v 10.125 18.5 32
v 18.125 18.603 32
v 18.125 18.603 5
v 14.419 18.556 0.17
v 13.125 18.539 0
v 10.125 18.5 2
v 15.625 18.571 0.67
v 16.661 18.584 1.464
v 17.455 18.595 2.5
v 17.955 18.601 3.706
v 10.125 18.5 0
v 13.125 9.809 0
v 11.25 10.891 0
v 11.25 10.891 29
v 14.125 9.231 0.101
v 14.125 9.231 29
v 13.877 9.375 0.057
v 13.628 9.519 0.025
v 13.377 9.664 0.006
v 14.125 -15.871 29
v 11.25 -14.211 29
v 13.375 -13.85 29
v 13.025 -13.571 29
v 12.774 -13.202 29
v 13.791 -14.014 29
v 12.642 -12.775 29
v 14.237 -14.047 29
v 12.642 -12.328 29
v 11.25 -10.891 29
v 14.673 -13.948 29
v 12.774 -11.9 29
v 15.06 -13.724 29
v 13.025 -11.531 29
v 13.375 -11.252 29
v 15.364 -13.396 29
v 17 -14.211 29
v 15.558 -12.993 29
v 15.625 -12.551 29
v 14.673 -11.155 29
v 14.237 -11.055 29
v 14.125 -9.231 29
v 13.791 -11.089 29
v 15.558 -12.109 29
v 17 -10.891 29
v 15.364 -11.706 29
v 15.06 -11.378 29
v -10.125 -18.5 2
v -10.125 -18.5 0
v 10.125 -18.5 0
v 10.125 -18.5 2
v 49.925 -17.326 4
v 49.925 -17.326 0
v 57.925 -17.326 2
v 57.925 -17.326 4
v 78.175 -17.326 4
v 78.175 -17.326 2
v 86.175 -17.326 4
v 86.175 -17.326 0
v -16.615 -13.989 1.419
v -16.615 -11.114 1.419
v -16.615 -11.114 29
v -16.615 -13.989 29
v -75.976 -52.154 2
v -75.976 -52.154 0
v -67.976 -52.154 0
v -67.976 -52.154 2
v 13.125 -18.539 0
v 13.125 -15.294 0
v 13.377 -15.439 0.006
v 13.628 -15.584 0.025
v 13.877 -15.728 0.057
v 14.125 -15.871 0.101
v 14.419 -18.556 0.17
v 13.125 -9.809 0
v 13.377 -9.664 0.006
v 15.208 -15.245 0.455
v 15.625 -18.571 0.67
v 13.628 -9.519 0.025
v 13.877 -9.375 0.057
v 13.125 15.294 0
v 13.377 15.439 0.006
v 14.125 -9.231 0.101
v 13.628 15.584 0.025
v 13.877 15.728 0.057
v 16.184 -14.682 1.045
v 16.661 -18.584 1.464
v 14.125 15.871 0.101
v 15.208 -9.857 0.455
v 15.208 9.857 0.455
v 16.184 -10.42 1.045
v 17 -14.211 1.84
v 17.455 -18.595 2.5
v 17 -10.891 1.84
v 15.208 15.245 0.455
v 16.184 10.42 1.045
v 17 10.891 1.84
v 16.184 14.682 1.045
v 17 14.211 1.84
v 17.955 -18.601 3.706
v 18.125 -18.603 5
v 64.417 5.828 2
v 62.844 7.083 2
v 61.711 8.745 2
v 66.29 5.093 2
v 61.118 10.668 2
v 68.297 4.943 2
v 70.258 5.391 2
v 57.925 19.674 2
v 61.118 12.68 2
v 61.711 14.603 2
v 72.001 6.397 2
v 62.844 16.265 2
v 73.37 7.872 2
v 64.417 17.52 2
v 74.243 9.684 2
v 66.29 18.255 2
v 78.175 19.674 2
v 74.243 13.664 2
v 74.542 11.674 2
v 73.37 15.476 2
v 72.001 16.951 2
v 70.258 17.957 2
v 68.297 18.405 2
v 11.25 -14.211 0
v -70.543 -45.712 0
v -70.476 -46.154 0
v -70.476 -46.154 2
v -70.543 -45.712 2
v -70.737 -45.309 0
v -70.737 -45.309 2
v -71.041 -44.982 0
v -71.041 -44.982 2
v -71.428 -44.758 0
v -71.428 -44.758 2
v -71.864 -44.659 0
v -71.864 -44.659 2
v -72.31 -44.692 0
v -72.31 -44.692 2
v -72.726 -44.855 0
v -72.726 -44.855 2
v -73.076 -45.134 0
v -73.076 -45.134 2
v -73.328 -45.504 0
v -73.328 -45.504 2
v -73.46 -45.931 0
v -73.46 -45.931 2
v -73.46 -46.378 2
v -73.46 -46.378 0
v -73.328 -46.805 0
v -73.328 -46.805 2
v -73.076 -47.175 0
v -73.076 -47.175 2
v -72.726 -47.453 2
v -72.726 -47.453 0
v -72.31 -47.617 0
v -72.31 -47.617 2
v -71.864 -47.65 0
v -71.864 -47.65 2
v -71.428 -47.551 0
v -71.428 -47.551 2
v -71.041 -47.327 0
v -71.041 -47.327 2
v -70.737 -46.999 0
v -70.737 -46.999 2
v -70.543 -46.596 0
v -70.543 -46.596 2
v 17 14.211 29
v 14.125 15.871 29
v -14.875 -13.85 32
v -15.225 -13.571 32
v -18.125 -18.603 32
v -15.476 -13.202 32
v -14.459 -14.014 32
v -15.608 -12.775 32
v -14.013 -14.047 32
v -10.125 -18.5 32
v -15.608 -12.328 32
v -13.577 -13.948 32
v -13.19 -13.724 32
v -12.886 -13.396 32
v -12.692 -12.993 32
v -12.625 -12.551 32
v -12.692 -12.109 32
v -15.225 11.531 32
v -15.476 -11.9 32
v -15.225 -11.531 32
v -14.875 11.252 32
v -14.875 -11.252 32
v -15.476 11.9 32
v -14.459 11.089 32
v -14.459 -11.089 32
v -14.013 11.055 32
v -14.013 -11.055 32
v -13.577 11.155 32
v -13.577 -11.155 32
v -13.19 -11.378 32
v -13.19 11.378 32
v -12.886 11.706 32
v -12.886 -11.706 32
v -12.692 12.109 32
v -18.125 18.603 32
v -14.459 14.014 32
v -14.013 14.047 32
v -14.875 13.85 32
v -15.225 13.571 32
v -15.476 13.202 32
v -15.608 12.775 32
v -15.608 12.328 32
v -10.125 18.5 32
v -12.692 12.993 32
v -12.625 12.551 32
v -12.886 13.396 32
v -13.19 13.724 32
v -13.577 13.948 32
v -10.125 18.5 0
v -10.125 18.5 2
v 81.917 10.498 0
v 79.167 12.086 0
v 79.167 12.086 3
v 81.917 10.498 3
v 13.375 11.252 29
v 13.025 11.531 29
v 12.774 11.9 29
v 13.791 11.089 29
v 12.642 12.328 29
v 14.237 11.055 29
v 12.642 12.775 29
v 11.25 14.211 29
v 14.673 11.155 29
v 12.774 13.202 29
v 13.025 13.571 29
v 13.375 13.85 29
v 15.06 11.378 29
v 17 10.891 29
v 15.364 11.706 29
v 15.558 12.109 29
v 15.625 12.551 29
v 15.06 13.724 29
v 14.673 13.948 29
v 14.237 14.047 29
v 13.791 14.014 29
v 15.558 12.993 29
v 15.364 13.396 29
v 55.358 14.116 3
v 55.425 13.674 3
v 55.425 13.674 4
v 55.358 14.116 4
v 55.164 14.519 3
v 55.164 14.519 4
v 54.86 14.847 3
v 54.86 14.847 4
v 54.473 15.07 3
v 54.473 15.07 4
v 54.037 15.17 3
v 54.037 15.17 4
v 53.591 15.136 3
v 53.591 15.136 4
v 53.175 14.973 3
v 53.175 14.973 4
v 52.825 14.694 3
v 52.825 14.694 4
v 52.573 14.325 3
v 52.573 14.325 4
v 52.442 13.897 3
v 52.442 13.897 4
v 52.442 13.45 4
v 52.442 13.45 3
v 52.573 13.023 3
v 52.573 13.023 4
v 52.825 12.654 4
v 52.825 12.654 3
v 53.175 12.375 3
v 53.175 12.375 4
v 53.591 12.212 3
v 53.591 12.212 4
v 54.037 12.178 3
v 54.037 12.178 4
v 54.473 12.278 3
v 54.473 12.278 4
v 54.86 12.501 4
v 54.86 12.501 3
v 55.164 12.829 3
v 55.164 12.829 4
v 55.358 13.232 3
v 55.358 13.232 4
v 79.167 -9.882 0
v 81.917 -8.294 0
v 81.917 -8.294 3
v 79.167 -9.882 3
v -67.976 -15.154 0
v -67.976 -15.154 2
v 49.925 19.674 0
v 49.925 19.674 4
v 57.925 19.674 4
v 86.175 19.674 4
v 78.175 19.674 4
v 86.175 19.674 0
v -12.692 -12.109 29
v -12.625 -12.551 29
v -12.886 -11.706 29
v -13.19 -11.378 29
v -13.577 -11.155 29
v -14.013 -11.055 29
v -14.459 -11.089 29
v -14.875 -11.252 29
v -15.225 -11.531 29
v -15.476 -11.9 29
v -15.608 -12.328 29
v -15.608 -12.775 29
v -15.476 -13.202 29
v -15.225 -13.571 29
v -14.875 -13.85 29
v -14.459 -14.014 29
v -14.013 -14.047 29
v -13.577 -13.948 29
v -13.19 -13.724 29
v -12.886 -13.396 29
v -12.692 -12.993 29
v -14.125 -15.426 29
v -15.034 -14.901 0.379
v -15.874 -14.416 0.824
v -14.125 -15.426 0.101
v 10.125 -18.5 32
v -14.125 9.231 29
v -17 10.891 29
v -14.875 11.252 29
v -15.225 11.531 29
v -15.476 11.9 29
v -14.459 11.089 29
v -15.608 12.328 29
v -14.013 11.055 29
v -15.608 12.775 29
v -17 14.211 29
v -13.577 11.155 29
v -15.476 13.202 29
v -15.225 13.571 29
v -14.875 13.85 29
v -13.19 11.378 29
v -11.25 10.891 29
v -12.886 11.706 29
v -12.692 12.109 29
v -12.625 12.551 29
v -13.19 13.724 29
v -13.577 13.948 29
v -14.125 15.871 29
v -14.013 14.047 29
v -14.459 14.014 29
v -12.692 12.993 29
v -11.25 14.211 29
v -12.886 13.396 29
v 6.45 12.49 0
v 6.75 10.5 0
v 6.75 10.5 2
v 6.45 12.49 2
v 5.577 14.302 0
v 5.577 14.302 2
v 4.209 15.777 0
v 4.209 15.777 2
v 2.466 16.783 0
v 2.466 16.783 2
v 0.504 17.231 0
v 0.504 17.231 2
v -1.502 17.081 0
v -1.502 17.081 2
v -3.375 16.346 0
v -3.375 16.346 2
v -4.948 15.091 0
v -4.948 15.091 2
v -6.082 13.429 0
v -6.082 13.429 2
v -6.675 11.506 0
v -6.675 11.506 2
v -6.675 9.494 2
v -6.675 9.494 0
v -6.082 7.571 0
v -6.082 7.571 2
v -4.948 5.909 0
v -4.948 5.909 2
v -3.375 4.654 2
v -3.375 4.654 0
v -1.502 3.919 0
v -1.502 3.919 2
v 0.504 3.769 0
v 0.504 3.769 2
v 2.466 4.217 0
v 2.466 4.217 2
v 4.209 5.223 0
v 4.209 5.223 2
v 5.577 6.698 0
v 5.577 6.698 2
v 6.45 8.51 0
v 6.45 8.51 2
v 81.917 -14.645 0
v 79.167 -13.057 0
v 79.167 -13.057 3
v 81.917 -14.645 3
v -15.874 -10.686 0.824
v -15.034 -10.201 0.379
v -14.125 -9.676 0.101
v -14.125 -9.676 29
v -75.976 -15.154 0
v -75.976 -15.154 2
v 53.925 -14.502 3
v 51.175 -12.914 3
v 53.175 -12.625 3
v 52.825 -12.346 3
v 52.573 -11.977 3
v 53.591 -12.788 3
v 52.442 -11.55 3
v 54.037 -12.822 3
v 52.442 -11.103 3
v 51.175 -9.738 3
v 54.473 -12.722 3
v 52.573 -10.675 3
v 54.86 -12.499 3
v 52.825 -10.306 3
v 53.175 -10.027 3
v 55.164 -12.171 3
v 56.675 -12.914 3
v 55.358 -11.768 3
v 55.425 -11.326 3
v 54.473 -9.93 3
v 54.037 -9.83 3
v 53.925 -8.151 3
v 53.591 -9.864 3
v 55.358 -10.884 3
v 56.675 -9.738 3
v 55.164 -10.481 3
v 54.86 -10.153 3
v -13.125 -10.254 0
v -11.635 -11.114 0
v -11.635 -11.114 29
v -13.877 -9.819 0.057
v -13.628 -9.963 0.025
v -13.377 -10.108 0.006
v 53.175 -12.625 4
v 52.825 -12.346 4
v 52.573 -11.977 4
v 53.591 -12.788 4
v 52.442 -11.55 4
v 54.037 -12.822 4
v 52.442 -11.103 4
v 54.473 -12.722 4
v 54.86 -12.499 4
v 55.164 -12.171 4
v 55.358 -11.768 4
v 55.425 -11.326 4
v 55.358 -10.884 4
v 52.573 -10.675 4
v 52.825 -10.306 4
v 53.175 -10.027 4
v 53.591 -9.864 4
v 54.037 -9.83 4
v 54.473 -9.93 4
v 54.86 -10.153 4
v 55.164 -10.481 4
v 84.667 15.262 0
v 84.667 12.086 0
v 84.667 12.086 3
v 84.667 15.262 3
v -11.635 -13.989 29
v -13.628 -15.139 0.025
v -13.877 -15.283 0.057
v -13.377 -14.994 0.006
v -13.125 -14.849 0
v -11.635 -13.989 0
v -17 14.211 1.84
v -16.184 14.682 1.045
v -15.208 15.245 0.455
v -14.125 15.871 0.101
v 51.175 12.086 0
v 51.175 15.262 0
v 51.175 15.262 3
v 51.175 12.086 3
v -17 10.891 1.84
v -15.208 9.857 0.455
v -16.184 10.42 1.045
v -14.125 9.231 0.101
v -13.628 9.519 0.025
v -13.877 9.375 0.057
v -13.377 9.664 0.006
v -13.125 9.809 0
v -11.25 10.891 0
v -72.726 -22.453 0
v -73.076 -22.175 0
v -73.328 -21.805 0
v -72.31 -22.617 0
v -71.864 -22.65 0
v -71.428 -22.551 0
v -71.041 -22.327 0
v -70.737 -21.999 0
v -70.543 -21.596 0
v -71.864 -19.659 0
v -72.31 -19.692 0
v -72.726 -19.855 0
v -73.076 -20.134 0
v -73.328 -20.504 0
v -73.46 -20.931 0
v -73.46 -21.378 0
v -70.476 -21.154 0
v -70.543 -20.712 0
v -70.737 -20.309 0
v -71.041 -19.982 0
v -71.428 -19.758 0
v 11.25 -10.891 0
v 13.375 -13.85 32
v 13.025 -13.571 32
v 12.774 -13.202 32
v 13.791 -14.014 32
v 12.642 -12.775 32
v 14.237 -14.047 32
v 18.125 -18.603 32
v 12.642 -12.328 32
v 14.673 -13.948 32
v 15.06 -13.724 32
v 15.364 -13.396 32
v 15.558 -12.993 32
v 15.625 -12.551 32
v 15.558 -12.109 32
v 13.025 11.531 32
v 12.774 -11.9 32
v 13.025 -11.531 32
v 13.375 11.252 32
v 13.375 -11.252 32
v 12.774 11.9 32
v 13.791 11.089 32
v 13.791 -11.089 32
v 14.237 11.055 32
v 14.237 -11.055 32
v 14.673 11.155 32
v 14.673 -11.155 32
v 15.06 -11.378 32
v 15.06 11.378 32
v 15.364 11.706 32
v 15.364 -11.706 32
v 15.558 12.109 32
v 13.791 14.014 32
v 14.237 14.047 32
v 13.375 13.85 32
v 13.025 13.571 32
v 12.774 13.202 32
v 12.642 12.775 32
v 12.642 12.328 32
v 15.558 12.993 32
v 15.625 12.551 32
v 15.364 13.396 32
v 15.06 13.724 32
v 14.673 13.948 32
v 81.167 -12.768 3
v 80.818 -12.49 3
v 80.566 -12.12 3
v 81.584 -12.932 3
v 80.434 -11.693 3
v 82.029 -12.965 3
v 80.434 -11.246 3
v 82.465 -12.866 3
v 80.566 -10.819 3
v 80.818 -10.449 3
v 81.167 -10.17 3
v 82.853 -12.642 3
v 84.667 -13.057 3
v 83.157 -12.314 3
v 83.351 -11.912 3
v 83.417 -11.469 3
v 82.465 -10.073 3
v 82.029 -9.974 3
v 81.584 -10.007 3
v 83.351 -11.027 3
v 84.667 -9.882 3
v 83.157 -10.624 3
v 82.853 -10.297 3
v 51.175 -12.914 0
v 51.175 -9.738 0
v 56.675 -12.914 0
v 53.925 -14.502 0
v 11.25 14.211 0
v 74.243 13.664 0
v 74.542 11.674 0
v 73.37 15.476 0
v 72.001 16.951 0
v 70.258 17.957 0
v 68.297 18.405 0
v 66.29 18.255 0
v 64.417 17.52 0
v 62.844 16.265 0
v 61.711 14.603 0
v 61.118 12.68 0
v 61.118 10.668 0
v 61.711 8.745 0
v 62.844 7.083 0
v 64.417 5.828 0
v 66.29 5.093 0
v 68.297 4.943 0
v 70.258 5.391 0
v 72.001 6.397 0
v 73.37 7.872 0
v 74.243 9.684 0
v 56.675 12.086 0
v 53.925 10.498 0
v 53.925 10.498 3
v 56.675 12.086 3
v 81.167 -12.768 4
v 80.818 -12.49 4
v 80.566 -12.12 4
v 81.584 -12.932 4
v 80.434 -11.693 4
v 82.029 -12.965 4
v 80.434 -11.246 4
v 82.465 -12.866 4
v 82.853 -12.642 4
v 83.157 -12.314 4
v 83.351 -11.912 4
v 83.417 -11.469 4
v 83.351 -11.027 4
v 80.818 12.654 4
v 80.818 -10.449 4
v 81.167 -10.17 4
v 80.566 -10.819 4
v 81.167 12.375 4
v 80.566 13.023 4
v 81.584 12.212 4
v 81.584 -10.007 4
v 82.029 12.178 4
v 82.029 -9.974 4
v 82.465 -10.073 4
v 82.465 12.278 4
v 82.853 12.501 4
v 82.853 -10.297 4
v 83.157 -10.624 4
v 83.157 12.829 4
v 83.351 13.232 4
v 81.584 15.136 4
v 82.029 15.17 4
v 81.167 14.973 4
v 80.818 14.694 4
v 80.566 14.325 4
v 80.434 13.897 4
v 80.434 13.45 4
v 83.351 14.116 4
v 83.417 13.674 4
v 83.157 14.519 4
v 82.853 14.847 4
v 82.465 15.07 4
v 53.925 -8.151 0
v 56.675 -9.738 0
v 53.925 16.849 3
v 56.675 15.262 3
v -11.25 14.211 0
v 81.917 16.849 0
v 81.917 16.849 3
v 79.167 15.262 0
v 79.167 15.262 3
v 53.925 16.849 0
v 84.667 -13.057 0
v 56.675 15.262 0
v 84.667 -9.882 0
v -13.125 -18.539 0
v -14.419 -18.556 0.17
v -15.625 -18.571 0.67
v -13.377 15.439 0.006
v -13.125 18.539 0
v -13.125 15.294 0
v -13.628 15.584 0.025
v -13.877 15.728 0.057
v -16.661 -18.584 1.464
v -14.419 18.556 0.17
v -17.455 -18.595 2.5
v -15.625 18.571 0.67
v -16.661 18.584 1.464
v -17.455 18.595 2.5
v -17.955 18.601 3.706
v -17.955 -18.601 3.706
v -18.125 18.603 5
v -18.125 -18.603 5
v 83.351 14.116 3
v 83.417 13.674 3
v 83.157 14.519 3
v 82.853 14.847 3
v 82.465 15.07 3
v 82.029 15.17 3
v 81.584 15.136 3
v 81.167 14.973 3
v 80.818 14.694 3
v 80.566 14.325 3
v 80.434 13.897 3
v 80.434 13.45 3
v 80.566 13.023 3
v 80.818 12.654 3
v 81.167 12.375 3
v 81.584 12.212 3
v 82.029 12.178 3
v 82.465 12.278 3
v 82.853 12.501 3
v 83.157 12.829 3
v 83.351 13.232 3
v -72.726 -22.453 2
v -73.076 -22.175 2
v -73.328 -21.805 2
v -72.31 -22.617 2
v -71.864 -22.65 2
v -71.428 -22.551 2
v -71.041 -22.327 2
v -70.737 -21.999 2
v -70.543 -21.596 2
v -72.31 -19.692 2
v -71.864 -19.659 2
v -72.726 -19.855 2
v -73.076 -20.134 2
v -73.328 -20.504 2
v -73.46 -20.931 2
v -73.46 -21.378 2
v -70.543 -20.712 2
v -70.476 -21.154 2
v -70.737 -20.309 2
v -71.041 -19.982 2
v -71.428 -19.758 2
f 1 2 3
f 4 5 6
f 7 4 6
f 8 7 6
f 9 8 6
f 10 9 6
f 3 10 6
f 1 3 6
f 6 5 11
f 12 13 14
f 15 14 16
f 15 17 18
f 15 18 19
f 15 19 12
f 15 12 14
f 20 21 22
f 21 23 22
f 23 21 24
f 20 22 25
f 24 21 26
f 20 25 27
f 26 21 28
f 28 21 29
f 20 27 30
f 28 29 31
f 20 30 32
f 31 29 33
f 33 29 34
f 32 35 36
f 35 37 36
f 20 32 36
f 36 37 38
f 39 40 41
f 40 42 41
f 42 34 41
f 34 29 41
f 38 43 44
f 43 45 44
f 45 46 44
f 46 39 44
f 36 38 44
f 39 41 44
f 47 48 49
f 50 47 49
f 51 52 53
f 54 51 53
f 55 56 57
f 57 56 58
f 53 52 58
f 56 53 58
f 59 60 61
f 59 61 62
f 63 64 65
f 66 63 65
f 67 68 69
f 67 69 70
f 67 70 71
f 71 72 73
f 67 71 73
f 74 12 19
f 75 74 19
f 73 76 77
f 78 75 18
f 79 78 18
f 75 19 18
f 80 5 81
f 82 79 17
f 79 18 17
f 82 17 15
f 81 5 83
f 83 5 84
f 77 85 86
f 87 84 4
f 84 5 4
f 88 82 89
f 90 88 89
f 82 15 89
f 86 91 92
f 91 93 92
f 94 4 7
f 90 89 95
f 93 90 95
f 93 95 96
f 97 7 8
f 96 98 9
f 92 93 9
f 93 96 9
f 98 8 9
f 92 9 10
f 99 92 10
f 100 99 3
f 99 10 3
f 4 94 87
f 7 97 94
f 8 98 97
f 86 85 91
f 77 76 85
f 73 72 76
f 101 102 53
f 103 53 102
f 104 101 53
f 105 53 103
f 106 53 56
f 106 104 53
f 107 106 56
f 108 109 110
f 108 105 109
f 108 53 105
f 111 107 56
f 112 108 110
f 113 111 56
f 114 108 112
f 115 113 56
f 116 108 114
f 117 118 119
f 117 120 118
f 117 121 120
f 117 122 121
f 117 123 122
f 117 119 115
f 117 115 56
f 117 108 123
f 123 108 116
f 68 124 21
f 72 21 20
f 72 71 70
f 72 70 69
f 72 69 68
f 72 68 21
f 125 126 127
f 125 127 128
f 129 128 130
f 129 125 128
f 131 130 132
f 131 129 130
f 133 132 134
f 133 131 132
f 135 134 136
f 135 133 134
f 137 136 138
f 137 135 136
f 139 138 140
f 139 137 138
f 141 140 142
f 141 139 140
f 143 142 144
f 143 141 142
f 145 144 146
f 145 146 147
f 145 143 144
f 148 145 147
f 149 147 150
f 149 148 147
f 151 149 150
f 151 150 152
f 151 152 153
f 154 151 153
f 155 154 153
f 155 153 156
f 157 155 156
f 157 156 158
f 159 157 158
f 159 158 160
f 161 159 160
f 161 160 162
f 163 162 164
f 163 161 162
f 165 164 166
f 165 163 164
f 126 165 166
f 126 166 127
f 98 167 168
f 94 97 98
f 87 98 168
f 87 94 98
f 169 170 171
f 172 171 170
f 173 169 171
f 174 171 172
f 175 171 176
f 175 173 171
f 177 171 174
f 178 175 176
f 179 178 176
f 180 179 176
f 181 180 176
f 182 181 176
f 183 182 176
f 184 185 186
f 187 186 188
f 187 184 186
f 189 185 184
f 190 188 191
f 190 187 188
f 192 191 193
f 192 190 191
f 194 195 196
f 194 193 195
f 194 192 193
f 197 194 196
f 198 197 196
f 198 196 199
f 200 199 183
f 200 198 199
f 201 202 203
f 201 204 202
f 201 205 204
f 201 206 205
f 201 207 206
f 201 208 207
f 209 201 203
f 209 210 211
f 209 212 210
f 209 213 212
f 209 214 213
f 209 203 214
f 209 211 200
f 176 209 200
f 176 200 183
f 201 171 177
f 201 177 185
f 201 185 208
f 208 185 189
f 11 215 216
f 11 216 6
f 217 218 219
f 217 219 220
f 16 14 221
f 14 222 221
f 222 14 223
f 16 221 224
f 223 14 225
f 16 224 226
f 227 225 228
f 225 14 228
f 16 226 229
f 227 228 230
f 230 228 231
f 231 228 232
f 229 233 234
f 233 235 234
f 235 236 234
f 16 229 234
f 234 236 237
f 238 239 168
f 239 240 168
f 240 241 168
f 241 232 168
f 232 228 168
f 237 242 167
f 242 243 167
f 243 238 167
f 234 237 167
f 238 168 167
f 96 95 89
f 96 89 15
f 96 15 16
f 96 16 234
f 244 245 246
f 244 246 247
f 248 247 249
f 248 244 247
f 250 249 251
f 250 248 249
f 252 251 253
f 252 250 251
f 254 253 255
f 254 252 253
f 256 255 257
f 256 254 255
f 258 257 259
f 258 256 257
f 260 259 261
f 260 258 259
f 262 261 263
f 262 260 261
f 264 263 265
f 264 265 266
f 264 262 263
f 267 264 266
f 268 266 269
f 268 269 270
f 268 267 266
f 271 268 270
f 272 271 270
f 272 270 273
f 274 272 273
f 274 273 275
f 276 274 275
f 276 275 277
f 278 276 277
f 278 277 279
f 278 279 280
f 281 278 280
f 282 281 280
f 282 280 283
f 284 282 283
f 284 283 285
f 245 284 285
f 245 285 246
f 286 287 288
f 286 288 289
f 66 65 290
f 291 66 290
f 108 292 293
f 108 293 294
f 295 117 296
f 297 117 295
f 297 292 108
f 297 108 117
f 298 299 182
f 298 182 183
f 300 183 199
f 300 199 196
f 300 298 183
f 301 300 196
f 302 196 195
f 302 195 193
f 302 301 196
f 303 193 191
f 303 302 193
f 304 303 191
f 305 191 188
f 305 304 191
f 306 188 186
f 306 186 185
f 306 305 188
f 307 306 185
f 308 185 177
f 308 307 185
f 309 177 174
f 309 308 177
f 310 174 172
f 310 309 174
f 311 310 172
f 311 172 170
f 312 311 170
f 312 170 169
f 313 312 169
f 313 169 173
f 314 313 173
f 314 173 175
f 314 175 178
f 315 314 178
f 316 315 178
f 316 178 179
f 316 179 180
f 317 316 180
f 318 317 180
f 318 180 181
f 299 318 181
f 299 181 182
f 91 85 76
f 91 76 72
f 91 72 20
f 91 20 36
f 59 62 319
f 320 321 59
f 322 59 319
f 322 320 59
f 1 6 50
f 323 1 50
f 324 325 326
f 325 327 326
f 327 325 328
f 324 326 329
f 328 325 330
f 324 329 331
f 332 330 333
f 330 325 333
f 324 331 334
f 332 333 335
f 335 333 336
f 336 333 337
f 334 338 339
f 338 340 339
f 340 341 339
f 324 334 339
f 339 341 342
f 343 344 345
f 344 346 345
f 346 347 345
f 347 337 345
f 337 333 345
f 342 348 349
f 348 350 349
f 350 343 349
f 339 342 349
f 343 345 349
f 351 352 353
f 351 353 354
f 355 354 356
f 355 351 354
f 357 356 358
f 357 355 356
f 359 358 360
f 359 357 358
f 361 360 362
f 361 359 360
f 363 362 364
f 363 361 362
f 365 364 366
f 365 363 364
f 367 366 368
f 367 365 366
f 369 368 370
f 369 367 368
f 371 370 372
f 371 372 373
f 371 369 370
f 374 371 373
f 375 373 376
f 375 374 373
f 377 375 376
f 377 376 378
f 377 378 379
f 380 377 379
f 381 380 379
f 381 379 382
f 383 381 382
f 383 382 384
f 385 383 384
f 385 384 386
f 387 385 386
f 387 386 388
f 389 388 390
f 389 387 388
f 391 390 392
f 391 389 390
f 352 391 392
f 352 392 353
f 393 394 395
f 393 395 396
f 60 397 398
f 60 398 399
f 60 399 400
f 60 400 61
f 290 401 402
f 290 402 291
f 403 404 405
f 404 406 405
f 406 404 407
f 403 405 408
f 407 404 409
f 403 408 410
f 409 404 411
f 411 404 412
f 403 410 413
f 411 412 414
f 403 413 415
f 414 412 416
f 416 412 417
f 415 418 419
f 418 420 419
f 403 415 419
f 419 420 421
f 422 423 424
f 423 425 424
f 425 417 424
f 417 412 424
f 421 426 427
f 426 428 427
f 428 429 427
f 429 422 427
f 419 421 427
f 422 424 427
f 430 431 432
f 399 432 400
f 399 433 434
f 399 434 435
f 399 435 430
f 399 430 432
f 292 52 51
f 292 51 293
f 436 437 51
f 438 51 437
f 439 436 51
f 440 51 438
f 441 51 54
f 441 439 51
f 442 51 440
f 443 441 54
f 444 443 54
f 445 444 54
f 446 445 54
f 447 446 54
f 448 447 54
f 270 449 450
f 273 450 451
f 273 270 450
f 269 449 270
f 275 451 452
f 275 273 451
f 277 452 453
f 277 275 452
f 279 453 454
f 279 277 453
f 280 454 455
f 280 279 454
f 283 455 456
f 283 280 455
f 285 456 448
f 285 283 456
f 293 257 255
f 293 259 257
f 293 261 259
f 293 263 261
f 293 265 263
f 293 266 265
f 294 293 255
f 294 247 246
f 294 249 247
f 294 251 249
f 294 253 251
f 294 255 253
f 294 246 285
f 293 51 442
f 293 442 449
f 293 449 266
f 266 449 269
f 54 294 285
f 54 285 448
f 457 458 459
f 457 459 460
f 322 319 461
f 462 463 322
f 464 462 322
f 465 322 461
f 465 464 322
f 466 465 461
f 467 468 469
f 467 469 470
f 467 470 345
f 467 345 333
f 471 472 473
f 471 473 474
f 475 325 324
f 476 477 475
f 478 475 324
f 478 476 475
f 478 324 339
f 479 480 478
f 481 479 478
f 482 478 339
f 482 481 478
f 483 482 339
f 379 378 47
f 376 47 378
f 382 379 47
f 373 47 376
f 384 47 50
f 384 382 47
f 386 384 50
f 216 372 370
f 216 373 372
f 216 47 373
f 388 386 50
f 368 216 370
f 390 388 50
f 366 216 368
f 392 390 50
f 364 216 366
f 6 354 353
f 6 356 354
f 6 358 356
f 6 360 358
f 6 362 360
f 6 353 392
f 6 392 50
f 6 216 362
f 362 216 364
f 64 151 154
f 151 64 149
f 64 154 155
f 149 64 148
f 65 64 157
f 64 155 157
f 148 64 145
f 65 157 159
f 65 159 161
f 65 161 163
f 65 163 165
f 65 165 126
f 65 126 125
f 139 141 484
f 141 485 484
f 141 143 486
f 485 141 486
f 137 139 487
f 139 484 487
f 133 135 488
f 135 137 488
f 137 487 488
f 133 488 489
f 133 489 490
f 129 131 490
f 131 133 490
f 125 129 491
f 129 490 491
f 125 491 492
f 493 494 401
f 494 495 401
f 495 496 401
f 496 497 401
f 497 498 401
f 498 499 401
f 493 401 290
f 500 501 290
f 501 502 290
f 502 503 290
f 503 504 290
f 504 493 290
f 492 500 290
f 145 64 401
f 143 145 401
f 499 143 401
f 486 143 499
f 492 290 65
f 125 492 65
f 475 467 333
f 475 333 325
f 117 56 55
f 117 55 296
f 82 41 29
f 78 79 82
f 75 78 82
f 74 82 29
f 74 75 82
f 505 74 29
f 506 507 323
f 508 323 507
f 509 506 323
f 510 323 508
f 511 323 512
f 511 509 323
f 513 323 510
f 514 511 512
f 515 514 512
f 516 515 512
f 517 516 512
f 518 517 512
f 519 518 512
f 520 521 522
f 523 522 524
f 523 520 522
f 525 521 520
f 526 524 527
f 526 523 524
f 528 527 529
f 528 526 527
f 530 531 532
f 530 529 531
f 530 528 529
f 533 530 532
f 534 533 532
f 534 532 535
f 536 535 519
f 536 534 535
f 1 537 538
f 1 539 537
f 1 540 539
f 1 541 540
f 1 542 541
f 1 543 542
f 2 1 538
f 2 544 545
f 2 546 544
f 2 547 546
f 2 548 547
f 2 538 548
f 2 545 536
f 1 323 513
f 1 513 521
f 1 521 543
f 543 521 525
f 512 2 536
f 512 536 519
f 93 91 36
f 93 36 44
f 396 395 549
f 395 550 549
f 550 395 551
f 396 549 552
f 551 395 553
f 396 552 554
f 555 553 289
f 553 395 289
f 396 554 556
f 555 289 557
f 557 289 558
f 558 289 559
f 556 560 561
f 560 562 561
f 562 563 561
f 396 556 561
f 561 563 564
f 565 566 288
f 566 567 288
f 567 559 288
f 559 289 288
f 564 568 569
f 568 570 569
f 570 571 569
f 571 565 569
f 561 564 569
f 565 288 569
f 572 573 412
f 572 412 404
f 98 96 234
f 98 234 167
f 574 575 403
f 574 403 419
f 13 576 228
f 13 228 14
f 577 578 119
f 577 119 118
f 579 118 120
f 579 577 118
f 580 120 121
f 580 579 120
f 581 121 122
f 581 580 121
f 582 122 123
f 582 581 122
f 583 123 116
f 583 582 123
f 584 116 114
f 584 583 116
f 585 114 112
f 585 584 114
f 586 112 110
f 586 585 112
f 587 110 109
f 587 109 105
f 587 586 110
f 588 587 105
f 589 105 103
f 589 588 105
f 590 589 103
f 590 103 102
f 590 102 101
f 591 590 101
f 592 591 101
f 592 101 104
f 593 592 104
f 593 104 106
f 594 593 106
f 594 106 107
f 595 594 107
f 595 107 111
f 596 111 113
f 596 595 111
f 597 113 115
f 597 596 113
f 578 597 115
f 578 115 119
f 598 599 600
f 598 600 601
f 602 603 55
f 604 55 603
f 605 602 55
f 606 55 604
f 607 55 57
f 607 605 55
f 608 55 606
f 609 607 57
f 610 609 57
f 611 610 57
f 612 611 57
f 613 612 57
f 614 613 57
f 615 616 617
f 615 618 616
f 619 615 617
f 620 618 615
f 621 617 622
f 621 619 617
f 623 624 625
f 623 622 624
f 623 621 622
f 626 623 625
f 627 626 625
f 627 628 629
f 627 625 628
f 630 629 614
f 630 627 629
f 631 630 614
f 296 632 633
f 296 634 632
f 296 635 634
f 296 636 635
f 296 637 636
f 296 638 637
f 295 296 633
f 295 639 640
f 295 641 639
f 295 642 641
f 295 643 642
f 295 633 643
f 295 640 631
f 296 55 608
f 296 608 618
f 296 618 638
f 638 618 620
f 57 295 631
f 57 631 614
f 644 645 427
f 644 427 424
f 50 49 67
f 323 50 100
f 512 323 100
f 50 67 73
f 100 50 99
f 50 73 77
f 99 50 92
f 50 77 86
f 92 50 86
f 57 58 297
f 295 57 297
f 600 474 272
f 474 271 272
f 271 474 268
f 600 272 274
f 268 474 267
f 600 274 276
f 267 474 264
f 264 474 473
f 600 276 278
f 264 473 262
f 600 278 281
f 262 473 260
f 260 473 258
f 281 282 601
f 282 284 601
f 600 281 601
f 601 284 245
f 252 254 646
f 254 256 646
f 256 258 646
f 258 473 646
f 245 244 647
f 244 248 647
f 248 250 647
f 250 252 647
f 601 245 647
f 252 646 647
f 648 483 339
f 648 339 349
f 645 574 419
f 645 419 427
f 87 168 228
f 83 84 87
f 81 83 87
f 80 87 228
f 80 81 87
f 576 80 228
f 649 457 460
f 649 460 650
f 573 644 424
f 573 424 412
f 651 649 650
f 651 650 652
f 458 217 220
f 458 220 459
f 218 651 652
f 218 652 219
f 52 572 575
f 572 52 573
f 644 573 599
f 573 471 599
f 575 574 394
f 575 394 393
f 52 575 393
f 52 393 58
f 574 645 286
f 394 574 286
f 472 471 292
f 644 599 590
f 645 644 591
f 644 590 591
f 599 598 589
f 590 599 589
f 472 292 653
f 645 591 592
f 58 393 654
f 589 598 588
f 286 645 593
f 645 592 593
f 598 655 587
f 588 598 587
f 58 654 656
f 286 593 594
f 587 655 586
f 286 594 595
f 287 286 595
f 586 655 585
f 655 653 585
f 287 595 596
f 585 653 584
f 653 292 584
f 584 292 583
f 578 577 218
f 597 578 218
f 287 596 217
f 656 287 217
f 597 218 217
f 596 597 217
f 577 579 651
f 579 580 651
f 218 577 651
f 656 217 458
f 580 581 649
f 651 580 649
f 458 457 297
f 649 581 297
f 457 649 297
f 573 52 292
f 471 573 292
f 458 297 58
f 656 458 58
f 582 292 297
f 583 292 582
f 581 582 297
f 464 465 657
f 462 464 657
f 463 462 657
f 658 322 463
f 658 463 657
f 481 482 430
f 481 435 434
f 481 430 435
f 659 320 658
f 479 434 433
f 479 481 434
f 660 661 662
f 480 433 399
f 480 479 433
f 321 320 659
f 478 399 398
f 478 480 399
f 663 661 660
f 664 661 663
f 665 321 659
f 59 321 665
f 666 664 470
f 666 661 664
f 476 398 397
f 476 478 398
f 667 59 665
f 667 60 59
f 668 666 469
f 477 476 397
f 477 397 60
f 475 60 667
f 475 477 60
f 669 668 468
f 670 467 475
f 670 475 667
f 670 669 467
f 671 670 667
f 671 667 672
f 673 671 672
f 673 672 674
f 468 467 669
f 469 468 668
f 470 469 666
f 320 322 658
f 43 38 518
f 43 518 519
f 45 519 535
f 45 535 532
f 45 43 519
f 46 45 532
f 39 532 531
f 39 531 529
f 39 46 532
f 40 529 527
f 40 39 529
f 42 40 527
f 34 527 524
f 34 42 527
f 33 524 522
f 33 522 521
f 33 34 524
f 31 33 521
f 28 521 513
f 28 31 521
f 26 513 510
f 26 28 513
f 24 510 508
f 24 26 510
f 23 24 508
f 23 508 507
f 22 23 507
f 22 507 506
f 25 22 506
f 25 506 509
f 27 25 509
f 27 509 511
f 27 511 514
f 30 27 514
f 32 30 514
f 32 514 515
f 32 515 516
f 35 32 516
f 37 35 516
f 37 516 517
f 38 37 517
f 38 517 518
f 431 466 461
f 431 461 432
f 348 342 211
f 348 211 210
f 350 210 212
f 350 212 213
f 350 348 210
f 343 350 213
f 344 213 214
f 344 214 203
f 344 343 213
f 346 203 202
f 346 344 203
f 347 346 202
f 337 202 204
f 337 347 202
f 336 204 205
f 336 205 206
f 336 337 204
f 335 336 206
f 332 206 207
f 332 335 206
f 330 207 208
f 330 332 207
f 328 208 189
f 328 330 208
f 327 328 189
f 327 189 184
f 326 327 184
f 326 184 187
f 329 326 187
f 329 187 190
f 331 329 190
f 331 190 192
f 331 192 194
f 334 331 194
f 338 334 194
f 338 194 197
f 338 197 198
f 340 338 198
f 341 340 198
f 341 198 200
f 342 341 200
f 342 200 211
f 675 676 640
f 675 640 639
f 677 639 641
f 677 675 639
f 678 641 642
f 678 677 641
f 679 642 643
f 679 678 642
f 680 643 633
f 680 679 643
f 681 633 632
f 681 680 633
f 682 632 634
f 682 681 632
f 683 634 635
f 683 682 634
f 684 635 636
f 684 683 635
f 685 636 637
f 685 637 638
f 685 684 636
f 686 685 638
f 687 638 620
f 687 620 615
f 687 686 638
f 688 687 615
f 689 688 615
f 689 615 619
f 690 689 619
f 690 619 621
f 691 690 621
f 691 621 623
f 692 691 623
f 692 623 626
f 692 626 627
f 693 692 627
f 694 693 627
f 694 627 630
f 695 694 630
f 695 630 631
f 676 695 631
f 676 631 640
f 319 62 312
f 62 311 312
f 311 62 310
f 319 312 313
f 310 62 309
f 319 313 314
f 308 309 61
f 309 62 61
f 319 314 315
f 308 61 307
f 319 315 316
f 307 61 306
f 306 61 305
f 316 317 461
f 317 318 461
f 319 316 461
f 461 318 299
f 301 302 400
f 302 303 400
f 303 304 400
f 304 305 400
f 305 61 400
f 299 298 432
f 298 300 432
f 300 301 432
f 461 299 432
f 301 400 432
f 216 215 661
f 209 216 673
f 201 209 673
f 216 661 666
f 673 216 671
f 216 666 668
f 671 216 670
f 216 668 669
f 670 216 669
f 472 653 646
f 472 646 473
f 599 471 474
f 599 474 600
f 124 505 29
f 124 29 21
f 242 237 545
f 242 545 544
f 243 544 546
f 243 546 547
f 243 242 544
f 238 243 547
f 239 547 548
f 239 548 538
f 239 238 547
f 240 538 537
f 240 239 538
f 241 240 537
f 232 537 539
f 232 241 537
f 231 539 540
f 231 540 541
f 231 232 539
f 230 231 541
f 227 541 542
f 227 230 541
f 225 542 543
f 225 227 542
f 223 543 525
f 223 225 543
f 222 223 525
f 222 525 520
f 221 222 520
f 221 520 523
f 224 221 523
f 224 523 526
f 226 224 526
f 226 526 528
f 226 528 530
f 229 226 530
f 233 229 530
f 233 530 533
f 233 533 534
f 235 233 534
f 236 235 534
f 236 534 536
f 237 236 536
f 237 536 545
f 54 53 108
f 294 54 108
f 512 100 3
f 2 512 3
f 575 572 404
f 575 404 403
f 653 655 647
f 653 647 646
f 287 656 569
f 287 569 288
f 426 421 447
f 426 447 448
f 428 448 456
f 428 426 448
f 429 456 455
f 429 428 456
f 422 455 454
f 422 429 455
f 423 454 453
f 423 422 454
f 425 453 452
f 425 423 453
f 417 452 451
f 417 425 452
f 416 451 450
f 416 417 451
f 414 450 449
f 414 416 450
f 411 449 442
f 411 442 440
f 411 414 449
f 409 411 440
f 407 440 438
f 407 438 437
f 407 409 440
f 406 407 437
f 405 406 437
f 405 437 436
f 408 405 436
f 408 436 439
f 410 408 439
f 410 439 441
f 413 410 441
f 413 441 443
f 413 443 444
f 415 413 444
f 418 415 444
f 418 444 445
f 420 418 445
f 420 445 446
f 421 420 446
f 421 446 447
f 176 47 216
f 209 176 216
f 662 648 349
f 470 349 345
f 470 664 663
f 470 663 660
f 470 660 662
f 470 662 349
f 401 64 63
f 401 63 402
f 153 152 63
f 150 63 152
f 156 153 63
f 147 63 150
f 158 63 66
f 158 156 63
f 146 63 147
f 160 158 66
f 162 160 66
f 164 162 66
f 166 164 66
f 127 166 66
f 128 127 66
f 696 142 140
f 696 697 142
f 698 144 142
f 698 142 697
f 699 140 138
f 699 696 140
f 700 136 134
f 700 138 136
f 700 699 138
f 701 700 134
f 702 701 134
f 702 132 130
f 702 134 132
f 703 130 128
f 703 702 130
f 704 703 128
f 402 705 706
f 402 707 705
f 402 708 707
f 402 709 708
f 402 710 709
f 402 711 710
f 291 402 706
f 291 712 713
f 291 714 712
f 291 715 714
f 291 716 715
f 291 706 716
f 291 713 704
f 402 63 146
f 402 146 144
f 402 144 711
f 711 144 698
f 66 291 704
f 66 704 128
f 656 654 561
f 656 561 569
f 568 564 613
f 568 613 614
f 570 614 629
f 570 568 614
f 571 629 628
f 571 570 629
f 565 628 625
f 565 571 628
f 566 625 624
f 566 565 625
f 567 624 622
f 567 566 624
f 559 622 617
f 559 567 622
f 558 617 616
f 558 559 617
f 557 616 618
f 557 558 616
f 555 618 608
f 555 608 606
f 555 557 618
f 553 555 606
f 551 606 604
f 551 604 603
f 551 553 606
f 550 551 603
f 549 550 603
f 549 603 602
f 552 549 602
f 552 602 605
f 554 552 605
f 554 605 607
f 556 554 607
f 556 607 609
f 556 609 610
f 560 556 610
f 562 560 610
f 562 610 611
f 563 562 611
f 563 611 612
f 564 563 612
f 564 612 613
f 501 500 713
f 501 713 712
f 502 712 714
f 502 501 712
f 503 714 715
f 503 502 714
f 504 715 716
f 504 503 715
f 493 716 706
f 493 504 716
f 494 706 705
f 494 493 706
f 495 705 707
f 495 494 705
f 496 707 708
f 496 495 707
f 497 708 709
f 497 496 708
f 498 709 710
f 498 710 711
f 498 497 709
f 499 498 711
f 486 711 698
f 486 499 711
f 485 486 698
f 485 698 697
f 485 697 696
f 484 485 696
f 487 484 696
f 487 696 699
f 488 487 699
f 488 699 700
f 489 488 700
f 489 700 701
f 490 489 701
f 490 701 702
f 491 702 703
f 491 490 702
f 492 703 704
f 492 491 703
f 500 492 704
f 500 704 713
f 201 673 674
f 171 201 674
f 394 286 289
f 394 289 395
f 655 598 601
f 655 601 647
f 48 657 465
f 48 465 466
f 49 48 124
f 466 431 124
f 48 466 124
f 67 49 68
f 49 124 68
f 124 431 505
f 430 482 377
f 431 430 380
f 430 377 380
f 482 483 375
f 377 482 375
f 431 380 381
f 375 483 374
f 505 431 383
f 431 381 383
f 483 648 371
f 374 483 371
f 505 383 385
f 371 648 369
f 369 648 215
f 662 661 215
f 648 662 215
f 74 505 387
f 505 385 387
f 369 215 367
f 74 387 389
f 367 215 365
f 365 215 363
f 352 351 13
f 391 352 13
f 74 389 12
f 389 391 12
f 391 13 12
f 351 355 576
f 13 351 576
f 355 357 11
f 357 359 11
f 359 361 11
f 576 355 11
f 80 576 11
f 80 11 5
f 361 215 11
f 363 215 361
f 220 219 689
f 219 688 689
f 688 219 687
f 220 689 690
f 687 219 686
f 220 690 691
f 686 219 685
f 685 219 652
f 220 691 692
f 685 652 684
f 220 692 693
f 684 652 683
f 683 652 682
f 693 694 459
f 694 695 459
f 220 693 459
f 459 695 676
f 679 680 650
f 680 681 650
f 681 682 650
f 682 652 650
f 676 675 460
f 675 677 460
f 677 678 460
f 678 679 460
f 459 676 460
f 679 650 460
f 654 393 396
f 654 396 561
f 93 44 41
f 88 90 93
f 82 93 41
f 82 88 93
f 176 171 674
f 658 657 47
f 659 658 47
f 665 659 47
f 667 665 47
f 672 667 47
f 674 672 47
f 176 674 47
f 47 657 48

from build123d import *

# Parameters (mm, degrees)
F0_W         = 20.25
F0_H         = 37
F0_R         = 6.75
F1_DEPTH     = 2
F0_R_2       = 1.5
F2_DEPTH     = 32
F3_DEPTH     = 29
F4_W         = 20.25
F4_H         = 37
F4_R         = 6.75
F5_DEPTH     = 2
F6_W         = 8
F6_H         = 37
F6_R         = 1.5
F7_DEPTH     = 2
F4_W_2       = 8
F4_R_2       = 1.5
F8_DEPTH     = 4
F9_DEPTH     = 3
F10_T1_DEPTH = 62.2068632793


# Not quite as in the source:
# - a fillet or chamfer that OpenCascade refuses, or shapes differently, is made with other operations: its cross-section is extruded or revolved along the edge and cut away or added


with BuildPart() as f1:
    # F0 (on Top) → F1 (new body)
    with BuildSketch(Plane.XY):
        Rectangle(F0_W, F0_H)
        with Locations((0, 10.5)):
            Circle(F0_R, mode=Mode.SUBTRACT)
    extrude(amount=F1_DEPTH)

    # F0 (on Top) → F2 (join)
    with BuildSketch(Plane.XY):
        Polygon((-10.125, -18.5), (-10.125, 18.5), (-18.125, 18.6034316397), (-18.125, -18.6034316397), align=None)
        Polygon((-16.6148230359, -11.1137143672), (-14.125, -9.6762143672), (-11.6351769641, -11.1137143672), (-11.6351769641, -13.9887143672), (-14.125, -15.4262143672), (-16.6148230359, -13.9887143672), align=None, mode=Mode.SUBTRACT)
        Polygon((-17, 14.2110963911), (-14.125, 15.870978415), (-11.25, 14.2110963911), (-11.25, 10.8913323432), (-14.125, 9.2314503193), (-17, 10.8913323432), align=None, mode=Mode.SUBTRACT)
        Polygon((18.125, 18.6034316397), (10.125, 18.5), (10.125, -18.5), (18.125, -18.6034316397), align=None)
        Polygon((11.25, -10.8913323432), (14.125, -9.2314503193), (17, -10.8913323432), (17, -14.2110963911), (14.125, -15.870978415), (11.25, -14.2110963911), align=None, mode=Mode.SUBTRACT)
        Polygon((11.25, 14.2110963911), (14.125, 15.870978415), (17, 14.2110963911), (17, 10.8913323432), (14.125, 9.2314503193), (11.25, 10.8913323432), align=None, mode=Mode.SUBTRACT)
        Polygon((17, -10.8913323432), (14.125, -9.2314503193), (11.25, -10.8913323432), (11.25, -14.2110963911), (14.125, -15.870978415), (17, -14.2110963911), align=None)
        with Locations((14.125, -12.5512143672)):
            Circle(F0_R_2, mode=Mode.SUBTRACT)
        Polygon((-11.6351769641, -11.1137143672), (-14.125, -9.6762143672), (-16.6148230359, -11.1137143672), (-16.6148230359, -13.9887143672), (-14.125, -15.4262143672), (-11.6351769641, -13.9887143672), align=None)
        with Locations((-14.125, -12.5512143672)):
            Circle(F0_R_2, mode=Mode.SUBTRACT)
        Polygon((-11.25, 14.2110963911), (-14.125, 15.870978415), (-17, 14.2110963911), (-17, 10.8913323432), (-14.125, 9.2314503193), (-11.25, 10.8913323432), align=None)
        with Locations((-14.125, 12.5512143672)):
            Circle(F0_R_2, mode=Mode.SUBTRACT)
        Polygon((17, 14.2110963911), (14.125, 15.870978415), (11.25, 14.2110963911), (11.25, 10.8913323432), (14.125, 9.2314503193), (17, 10.8913323432), align=None)
        with Locations((14.125, 12.5512143672)):
            Circle(F0_R_2, mode=Mode.SUBTRACT)
    extrude(amount=F2_DEPTH)

    # F0 (on Top) → F3 (cut)
    with BuildSketch(Plane.XY):
        Polygon((17, -10.8913323432), (14.125, -9.2314503193), (11.25, -10.8913323432), (11.25, -14.2110963911), (14.125, -15.870978415), (17, -14.2110963911), align=None)
        with Locations((14.125, -12.5512143672)):
            Circle(F0_R_2, mode=Mode.SUBTRACT)
        Polygon((17, 14.2110963911), (14.125, 15.870978415), (11.25, 14.2110963911), (11.25, 10.8913323432), (14.125, 9.2314503193), (17, 10.8913323432), align=None)
        with Locations((14.125, 12.5512143672)):
            Circle(F0_R_2, mode=Mode.SUBTRACT)
        Polygon((-11.25, 14.2110963911), (-14.125, 15.870978415), (-17, 14.2110963911), (-17, 10.8913323432), (-14.125, 9.2314503193), (-11.25, 10.8913323432), align=None)
        with Locations((-14.125, 12.5512143672)):
            Circle(F0_R_2, mode=Mode.SUBTRACT)
        Polygon((-11.6351769641, -11.1137143672), (-14.125, -9.6762143672), (-16.6148230359, -11.1137143672), (-16.6148230359, -13.9887143672), (-14.125, -15.4262143672), (-11.6351769641, -13.9887143672), align=None)
        with Locations((-14.125, -12.5512143672)):
            Circle(F0_R_2, mode=Mode.SUBTRACT)
    extrude(amount=F3_DEPTH, mode=Mode.SUBTRACT)

    # F10: fillet of radius 5 on 2 edges, made by hand

    # F10_s2 → F10_t1 (cut)
    with BuildSketch(Plane.XZ.offset(-31.1034316397)):
        with BuildLine():
            ThreePointArc((-13.125, 0), (-16.6605339059, 1.4644660941), (-18.125, 5))
            Line((-18.125, 5), (-18.125, 0))
            Line((-18.125, 0), (-13.125, 0))
        make_face()
        with BuildLine():
            ThreePointArc((13.125, 0), (16.6605339059, 1.4644660941), (18.125, 5))
            Line((18.125, 5), (18.125, 0))
            Line((18.125, 0), (13.125, 0))
        make_face()
    extrude(amount=F10_T1_DEPTH, mode=Mode.SUBTRACT)


with BuildPart() as f5:
    # F4 (on Top) → F5 (new body)
    with BuildSketch(Plane.XY):
        with Locations((68.0498939753, 1.1739132404)):
            Rectangle(F4_W, F4_H)
        with Locations((67.7923956513, 11.6739132404)):
            Circle(F4_R, mode=Mode.SUBTRACT)
    extrude(amount=F5_DEPTH)

    # F4 (on Top) → F8 (join)
    with BuildSketch(Plane.XY):
        with Locations((53.9248939753, 1.1739132404)):
            Rectangle(F4_W_2, F4_H)
        Polygon((53.9248939753, -14.5015132401), (51.1748939753, -12.9137999998), (51.1748939753, -9.7383735193), (53.9248939753, -8.150660279), (56.6748939753, -9.7383735193), (56.6748939753, -12.9137999998), align=None, mode=Mode.SUBTRACT)
        Polygon((53.9248939753, 10.4984867599), (51.1748939753, 12.0862000002), (51.1748939753, 15.2616264807), (53.9248939753, 16.849339721), (56.6748939753, 15.2616264807), (56.6748939753, 12.0862000002), align=None, mode=Mode.SUBTRACT)
        with Locations((82.1748939753, 1.1739132404)):
            Rectangle(F4_W_2, F4_H)
        Polygon((81.9173956513, -8.2939509534), (84.6673956513, -9.8816641936), (84.6673956513, -13.0570906742), (81.9173956513, -14.6448039144), (79.1673956513, -13.0570906742), (79.1673956513, -9.8816641936), align=None, mode=Mode.SUBTRACT)
        Polygon((81.9173956513, 16.849339721), (84.6673956513, 15.2616264807), (84.6673956513, 12.0862000002), (81.9173956513, 10.4984867599), (79.1673956513, 12.0862000002), (79.1673956513, 15.2616264807), align=None, mode=Mode.SUBTRACT)
        Polygon((51.1748939753, -9.7383735193), (51.1748939753, -12.9137999998), (53.9248939753, -14.5015132401), (56.6748939753, -12.9137999998), (56.6748939753, -9.7383735193), (53.9248939753, -8.150660279), align=None)
        with Locations((53.9248939753, -11.3260867596)):
            Circle(F4_R_2, mode=Mode.SUBTRACT)
        Polygon((51.1748939753, 15.2616264807), (51.1748939753, 12.0862000002), (53.9248939753, 10.4984867599), (56.6748939753, 12.0862000002), (56.6748939753, 15.2616264807), (53.9248939753, 16.849339721), align=None)
        with Locations((53.9248939753, 13.6739132404)):
            Circle(F4_R_2, mode=Mode.SUBTRACT)
        Polygon((84.6673956513, -13.0570906742), (84.6673956513, -9.8816641936), (81.9173956513, -8.2939509534), (79.1673956513, -9.8816641936), (79.1673956513, -13.0570906742), (81.9173956513, -14.6448039144), align=None)
        with Locations((81.9173956513, -11.4693774339)):
            Circle(F4_R_2, mode=Mode.SUBTRACT)
        Polygon((84.6673956513, 12.0862000002), (84.6673956513, 15.2616264807), (81.9173956513, 16.849339721), (79.1673956513, 15.2616264807), (79.1673956513, 12.0862000002), (81.9173956513, 10.4984867599), align=None)
        with Locations((81.9173956513, 13.6739132404)):
            Circle(F4_R_2, mode=Mode.SUBTRACT)
    extrude(amount=F8_DEPTH)

    # F4 (on Top) → F9 (cut)
    with BuildSketch(Plane.XY):
        Polygon((51.1748939753, 15.2616264807), (51.1748939753, 12.0862000002), (53.9248939753, 10.4984867599), (56.6748939753, 12.0862000002), (56.6748939753, 15.2616264807), (53.9248939753, 16.849339721), align=None)
        with Locations((53.9248939753, 13.6739132404)):
            Circle(F4_R_2, mode=Mode.SUBTRACT)
        Polygon((84.6673956513, 12.0862000002), (84.6673956513, 15.2616264807), (81.9173956513, 16.849339721), (79.1673956513, 15.2616264807), (79.1673956513, 12.0862000002), (81.9173956513, 10.4984867599), align=None)
        with Locations((81.9173956513, 13.6739132404)):
            Circle(F4_R_2, mode=Mode.SUBTRACT)
        Polygon((84.6673956513, -13.0570906742), (84.6673956513, -9.8816641936), (81.9173956513, -8.2939509534), (79.1673956513, -9.8816641936), (79.1673956513, -13.0570906742), (81.9173956513, -14.6448039144), align=None)
        with Locations((81.9173956513, -11.4693774339)):
            Circle(F4_R_2, mode=Mode.SUBTRACT)
        Polygon((51.1748939753, -9.7383735193), (51.1748939753, -12.9137999998), (53.9248939753, -14.5015132401), (56.6748939753, -12.9137999998), (56.6748939753, -9.7383735193), (53.9248939753, -8.150660279), align=None)
        with Locations((53.9248939753, -11.3260867596)):
            Circle(F4_R_2, mode=Mode.SUBTRACT)
    extrude(amount=F9_DEPTH, mode=Mode.SUBTRACT)


with BuildPart() as f7:
    # F6 (on Top) → F7 (new body)
    with BuildSketch(Plane.XY):
        with Locations((-71.9763954457, -33.6543595721)):
            Rectangle(F6_W, F6_H)
        with Locations((-71.9763954457, -46.1543595721)):
            Circle(F6_R, mode=Mode.SUBTRACT)
        with Locations((-71.9763954457, -21.1543595721)):
            Circle(F6_R, mode=Mode.SUBTRACT)
    extrude(amount=F7_DEPTH)


solid = Compound([f1.part, f5.part, f7.part])
